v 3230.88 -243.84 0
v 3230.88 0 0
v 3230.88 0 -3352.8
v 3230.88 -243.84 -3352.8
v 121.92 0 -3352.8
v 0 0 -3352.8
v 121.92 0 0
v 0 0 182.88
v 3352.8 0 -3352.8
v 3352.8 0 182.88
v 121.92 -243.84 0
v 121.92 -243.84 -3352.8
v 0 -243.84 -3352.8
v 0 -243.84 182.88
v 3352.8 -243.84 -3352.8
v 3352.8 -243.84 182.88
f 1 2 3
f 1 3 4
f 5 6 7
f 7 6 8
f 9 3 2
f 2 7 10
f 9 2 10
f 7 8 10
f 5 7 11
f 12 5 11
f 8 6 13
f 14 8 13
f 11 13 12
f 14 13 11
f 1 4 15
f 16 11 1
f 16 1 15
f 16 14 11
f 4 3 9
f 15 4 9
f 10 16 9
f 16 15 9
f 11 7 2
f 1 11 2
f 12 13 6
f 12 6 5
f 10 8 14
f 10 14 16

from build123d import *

# Parameters (mm, degrees)
F0_W     = 3352.8
F0_H     = 243.84
F1_DEPTH = 182.88
F2_W     = 121.92
F2_H     = 243.84
F3_DEPTH = 3352.8


with BuildPart() as f1:
    # F0 (on Top) → F1 (new body)
    with BuildSketch(Plane.XY):
        with Locations((1676.4, -121.92)):
            Rectangle(F0_W, F0_H)
    extrude(amount=F1_DEPTH)

    # F2 (on face) → F3 (join)
    with BuildSketch(Plane(origin=(0, 0, 0), x_dir=(1, 0, 0), z_dir=(0, 0, -1))):
        with Locations((60.96, 121.92)):
            Rectangle(F2_W, F2_H)
        with Locations((3291.84, 121.92)):
            Rectangle(F2_W, F2_H)
    extrude(amount=F3_DEPTH)


solid = f1.part
